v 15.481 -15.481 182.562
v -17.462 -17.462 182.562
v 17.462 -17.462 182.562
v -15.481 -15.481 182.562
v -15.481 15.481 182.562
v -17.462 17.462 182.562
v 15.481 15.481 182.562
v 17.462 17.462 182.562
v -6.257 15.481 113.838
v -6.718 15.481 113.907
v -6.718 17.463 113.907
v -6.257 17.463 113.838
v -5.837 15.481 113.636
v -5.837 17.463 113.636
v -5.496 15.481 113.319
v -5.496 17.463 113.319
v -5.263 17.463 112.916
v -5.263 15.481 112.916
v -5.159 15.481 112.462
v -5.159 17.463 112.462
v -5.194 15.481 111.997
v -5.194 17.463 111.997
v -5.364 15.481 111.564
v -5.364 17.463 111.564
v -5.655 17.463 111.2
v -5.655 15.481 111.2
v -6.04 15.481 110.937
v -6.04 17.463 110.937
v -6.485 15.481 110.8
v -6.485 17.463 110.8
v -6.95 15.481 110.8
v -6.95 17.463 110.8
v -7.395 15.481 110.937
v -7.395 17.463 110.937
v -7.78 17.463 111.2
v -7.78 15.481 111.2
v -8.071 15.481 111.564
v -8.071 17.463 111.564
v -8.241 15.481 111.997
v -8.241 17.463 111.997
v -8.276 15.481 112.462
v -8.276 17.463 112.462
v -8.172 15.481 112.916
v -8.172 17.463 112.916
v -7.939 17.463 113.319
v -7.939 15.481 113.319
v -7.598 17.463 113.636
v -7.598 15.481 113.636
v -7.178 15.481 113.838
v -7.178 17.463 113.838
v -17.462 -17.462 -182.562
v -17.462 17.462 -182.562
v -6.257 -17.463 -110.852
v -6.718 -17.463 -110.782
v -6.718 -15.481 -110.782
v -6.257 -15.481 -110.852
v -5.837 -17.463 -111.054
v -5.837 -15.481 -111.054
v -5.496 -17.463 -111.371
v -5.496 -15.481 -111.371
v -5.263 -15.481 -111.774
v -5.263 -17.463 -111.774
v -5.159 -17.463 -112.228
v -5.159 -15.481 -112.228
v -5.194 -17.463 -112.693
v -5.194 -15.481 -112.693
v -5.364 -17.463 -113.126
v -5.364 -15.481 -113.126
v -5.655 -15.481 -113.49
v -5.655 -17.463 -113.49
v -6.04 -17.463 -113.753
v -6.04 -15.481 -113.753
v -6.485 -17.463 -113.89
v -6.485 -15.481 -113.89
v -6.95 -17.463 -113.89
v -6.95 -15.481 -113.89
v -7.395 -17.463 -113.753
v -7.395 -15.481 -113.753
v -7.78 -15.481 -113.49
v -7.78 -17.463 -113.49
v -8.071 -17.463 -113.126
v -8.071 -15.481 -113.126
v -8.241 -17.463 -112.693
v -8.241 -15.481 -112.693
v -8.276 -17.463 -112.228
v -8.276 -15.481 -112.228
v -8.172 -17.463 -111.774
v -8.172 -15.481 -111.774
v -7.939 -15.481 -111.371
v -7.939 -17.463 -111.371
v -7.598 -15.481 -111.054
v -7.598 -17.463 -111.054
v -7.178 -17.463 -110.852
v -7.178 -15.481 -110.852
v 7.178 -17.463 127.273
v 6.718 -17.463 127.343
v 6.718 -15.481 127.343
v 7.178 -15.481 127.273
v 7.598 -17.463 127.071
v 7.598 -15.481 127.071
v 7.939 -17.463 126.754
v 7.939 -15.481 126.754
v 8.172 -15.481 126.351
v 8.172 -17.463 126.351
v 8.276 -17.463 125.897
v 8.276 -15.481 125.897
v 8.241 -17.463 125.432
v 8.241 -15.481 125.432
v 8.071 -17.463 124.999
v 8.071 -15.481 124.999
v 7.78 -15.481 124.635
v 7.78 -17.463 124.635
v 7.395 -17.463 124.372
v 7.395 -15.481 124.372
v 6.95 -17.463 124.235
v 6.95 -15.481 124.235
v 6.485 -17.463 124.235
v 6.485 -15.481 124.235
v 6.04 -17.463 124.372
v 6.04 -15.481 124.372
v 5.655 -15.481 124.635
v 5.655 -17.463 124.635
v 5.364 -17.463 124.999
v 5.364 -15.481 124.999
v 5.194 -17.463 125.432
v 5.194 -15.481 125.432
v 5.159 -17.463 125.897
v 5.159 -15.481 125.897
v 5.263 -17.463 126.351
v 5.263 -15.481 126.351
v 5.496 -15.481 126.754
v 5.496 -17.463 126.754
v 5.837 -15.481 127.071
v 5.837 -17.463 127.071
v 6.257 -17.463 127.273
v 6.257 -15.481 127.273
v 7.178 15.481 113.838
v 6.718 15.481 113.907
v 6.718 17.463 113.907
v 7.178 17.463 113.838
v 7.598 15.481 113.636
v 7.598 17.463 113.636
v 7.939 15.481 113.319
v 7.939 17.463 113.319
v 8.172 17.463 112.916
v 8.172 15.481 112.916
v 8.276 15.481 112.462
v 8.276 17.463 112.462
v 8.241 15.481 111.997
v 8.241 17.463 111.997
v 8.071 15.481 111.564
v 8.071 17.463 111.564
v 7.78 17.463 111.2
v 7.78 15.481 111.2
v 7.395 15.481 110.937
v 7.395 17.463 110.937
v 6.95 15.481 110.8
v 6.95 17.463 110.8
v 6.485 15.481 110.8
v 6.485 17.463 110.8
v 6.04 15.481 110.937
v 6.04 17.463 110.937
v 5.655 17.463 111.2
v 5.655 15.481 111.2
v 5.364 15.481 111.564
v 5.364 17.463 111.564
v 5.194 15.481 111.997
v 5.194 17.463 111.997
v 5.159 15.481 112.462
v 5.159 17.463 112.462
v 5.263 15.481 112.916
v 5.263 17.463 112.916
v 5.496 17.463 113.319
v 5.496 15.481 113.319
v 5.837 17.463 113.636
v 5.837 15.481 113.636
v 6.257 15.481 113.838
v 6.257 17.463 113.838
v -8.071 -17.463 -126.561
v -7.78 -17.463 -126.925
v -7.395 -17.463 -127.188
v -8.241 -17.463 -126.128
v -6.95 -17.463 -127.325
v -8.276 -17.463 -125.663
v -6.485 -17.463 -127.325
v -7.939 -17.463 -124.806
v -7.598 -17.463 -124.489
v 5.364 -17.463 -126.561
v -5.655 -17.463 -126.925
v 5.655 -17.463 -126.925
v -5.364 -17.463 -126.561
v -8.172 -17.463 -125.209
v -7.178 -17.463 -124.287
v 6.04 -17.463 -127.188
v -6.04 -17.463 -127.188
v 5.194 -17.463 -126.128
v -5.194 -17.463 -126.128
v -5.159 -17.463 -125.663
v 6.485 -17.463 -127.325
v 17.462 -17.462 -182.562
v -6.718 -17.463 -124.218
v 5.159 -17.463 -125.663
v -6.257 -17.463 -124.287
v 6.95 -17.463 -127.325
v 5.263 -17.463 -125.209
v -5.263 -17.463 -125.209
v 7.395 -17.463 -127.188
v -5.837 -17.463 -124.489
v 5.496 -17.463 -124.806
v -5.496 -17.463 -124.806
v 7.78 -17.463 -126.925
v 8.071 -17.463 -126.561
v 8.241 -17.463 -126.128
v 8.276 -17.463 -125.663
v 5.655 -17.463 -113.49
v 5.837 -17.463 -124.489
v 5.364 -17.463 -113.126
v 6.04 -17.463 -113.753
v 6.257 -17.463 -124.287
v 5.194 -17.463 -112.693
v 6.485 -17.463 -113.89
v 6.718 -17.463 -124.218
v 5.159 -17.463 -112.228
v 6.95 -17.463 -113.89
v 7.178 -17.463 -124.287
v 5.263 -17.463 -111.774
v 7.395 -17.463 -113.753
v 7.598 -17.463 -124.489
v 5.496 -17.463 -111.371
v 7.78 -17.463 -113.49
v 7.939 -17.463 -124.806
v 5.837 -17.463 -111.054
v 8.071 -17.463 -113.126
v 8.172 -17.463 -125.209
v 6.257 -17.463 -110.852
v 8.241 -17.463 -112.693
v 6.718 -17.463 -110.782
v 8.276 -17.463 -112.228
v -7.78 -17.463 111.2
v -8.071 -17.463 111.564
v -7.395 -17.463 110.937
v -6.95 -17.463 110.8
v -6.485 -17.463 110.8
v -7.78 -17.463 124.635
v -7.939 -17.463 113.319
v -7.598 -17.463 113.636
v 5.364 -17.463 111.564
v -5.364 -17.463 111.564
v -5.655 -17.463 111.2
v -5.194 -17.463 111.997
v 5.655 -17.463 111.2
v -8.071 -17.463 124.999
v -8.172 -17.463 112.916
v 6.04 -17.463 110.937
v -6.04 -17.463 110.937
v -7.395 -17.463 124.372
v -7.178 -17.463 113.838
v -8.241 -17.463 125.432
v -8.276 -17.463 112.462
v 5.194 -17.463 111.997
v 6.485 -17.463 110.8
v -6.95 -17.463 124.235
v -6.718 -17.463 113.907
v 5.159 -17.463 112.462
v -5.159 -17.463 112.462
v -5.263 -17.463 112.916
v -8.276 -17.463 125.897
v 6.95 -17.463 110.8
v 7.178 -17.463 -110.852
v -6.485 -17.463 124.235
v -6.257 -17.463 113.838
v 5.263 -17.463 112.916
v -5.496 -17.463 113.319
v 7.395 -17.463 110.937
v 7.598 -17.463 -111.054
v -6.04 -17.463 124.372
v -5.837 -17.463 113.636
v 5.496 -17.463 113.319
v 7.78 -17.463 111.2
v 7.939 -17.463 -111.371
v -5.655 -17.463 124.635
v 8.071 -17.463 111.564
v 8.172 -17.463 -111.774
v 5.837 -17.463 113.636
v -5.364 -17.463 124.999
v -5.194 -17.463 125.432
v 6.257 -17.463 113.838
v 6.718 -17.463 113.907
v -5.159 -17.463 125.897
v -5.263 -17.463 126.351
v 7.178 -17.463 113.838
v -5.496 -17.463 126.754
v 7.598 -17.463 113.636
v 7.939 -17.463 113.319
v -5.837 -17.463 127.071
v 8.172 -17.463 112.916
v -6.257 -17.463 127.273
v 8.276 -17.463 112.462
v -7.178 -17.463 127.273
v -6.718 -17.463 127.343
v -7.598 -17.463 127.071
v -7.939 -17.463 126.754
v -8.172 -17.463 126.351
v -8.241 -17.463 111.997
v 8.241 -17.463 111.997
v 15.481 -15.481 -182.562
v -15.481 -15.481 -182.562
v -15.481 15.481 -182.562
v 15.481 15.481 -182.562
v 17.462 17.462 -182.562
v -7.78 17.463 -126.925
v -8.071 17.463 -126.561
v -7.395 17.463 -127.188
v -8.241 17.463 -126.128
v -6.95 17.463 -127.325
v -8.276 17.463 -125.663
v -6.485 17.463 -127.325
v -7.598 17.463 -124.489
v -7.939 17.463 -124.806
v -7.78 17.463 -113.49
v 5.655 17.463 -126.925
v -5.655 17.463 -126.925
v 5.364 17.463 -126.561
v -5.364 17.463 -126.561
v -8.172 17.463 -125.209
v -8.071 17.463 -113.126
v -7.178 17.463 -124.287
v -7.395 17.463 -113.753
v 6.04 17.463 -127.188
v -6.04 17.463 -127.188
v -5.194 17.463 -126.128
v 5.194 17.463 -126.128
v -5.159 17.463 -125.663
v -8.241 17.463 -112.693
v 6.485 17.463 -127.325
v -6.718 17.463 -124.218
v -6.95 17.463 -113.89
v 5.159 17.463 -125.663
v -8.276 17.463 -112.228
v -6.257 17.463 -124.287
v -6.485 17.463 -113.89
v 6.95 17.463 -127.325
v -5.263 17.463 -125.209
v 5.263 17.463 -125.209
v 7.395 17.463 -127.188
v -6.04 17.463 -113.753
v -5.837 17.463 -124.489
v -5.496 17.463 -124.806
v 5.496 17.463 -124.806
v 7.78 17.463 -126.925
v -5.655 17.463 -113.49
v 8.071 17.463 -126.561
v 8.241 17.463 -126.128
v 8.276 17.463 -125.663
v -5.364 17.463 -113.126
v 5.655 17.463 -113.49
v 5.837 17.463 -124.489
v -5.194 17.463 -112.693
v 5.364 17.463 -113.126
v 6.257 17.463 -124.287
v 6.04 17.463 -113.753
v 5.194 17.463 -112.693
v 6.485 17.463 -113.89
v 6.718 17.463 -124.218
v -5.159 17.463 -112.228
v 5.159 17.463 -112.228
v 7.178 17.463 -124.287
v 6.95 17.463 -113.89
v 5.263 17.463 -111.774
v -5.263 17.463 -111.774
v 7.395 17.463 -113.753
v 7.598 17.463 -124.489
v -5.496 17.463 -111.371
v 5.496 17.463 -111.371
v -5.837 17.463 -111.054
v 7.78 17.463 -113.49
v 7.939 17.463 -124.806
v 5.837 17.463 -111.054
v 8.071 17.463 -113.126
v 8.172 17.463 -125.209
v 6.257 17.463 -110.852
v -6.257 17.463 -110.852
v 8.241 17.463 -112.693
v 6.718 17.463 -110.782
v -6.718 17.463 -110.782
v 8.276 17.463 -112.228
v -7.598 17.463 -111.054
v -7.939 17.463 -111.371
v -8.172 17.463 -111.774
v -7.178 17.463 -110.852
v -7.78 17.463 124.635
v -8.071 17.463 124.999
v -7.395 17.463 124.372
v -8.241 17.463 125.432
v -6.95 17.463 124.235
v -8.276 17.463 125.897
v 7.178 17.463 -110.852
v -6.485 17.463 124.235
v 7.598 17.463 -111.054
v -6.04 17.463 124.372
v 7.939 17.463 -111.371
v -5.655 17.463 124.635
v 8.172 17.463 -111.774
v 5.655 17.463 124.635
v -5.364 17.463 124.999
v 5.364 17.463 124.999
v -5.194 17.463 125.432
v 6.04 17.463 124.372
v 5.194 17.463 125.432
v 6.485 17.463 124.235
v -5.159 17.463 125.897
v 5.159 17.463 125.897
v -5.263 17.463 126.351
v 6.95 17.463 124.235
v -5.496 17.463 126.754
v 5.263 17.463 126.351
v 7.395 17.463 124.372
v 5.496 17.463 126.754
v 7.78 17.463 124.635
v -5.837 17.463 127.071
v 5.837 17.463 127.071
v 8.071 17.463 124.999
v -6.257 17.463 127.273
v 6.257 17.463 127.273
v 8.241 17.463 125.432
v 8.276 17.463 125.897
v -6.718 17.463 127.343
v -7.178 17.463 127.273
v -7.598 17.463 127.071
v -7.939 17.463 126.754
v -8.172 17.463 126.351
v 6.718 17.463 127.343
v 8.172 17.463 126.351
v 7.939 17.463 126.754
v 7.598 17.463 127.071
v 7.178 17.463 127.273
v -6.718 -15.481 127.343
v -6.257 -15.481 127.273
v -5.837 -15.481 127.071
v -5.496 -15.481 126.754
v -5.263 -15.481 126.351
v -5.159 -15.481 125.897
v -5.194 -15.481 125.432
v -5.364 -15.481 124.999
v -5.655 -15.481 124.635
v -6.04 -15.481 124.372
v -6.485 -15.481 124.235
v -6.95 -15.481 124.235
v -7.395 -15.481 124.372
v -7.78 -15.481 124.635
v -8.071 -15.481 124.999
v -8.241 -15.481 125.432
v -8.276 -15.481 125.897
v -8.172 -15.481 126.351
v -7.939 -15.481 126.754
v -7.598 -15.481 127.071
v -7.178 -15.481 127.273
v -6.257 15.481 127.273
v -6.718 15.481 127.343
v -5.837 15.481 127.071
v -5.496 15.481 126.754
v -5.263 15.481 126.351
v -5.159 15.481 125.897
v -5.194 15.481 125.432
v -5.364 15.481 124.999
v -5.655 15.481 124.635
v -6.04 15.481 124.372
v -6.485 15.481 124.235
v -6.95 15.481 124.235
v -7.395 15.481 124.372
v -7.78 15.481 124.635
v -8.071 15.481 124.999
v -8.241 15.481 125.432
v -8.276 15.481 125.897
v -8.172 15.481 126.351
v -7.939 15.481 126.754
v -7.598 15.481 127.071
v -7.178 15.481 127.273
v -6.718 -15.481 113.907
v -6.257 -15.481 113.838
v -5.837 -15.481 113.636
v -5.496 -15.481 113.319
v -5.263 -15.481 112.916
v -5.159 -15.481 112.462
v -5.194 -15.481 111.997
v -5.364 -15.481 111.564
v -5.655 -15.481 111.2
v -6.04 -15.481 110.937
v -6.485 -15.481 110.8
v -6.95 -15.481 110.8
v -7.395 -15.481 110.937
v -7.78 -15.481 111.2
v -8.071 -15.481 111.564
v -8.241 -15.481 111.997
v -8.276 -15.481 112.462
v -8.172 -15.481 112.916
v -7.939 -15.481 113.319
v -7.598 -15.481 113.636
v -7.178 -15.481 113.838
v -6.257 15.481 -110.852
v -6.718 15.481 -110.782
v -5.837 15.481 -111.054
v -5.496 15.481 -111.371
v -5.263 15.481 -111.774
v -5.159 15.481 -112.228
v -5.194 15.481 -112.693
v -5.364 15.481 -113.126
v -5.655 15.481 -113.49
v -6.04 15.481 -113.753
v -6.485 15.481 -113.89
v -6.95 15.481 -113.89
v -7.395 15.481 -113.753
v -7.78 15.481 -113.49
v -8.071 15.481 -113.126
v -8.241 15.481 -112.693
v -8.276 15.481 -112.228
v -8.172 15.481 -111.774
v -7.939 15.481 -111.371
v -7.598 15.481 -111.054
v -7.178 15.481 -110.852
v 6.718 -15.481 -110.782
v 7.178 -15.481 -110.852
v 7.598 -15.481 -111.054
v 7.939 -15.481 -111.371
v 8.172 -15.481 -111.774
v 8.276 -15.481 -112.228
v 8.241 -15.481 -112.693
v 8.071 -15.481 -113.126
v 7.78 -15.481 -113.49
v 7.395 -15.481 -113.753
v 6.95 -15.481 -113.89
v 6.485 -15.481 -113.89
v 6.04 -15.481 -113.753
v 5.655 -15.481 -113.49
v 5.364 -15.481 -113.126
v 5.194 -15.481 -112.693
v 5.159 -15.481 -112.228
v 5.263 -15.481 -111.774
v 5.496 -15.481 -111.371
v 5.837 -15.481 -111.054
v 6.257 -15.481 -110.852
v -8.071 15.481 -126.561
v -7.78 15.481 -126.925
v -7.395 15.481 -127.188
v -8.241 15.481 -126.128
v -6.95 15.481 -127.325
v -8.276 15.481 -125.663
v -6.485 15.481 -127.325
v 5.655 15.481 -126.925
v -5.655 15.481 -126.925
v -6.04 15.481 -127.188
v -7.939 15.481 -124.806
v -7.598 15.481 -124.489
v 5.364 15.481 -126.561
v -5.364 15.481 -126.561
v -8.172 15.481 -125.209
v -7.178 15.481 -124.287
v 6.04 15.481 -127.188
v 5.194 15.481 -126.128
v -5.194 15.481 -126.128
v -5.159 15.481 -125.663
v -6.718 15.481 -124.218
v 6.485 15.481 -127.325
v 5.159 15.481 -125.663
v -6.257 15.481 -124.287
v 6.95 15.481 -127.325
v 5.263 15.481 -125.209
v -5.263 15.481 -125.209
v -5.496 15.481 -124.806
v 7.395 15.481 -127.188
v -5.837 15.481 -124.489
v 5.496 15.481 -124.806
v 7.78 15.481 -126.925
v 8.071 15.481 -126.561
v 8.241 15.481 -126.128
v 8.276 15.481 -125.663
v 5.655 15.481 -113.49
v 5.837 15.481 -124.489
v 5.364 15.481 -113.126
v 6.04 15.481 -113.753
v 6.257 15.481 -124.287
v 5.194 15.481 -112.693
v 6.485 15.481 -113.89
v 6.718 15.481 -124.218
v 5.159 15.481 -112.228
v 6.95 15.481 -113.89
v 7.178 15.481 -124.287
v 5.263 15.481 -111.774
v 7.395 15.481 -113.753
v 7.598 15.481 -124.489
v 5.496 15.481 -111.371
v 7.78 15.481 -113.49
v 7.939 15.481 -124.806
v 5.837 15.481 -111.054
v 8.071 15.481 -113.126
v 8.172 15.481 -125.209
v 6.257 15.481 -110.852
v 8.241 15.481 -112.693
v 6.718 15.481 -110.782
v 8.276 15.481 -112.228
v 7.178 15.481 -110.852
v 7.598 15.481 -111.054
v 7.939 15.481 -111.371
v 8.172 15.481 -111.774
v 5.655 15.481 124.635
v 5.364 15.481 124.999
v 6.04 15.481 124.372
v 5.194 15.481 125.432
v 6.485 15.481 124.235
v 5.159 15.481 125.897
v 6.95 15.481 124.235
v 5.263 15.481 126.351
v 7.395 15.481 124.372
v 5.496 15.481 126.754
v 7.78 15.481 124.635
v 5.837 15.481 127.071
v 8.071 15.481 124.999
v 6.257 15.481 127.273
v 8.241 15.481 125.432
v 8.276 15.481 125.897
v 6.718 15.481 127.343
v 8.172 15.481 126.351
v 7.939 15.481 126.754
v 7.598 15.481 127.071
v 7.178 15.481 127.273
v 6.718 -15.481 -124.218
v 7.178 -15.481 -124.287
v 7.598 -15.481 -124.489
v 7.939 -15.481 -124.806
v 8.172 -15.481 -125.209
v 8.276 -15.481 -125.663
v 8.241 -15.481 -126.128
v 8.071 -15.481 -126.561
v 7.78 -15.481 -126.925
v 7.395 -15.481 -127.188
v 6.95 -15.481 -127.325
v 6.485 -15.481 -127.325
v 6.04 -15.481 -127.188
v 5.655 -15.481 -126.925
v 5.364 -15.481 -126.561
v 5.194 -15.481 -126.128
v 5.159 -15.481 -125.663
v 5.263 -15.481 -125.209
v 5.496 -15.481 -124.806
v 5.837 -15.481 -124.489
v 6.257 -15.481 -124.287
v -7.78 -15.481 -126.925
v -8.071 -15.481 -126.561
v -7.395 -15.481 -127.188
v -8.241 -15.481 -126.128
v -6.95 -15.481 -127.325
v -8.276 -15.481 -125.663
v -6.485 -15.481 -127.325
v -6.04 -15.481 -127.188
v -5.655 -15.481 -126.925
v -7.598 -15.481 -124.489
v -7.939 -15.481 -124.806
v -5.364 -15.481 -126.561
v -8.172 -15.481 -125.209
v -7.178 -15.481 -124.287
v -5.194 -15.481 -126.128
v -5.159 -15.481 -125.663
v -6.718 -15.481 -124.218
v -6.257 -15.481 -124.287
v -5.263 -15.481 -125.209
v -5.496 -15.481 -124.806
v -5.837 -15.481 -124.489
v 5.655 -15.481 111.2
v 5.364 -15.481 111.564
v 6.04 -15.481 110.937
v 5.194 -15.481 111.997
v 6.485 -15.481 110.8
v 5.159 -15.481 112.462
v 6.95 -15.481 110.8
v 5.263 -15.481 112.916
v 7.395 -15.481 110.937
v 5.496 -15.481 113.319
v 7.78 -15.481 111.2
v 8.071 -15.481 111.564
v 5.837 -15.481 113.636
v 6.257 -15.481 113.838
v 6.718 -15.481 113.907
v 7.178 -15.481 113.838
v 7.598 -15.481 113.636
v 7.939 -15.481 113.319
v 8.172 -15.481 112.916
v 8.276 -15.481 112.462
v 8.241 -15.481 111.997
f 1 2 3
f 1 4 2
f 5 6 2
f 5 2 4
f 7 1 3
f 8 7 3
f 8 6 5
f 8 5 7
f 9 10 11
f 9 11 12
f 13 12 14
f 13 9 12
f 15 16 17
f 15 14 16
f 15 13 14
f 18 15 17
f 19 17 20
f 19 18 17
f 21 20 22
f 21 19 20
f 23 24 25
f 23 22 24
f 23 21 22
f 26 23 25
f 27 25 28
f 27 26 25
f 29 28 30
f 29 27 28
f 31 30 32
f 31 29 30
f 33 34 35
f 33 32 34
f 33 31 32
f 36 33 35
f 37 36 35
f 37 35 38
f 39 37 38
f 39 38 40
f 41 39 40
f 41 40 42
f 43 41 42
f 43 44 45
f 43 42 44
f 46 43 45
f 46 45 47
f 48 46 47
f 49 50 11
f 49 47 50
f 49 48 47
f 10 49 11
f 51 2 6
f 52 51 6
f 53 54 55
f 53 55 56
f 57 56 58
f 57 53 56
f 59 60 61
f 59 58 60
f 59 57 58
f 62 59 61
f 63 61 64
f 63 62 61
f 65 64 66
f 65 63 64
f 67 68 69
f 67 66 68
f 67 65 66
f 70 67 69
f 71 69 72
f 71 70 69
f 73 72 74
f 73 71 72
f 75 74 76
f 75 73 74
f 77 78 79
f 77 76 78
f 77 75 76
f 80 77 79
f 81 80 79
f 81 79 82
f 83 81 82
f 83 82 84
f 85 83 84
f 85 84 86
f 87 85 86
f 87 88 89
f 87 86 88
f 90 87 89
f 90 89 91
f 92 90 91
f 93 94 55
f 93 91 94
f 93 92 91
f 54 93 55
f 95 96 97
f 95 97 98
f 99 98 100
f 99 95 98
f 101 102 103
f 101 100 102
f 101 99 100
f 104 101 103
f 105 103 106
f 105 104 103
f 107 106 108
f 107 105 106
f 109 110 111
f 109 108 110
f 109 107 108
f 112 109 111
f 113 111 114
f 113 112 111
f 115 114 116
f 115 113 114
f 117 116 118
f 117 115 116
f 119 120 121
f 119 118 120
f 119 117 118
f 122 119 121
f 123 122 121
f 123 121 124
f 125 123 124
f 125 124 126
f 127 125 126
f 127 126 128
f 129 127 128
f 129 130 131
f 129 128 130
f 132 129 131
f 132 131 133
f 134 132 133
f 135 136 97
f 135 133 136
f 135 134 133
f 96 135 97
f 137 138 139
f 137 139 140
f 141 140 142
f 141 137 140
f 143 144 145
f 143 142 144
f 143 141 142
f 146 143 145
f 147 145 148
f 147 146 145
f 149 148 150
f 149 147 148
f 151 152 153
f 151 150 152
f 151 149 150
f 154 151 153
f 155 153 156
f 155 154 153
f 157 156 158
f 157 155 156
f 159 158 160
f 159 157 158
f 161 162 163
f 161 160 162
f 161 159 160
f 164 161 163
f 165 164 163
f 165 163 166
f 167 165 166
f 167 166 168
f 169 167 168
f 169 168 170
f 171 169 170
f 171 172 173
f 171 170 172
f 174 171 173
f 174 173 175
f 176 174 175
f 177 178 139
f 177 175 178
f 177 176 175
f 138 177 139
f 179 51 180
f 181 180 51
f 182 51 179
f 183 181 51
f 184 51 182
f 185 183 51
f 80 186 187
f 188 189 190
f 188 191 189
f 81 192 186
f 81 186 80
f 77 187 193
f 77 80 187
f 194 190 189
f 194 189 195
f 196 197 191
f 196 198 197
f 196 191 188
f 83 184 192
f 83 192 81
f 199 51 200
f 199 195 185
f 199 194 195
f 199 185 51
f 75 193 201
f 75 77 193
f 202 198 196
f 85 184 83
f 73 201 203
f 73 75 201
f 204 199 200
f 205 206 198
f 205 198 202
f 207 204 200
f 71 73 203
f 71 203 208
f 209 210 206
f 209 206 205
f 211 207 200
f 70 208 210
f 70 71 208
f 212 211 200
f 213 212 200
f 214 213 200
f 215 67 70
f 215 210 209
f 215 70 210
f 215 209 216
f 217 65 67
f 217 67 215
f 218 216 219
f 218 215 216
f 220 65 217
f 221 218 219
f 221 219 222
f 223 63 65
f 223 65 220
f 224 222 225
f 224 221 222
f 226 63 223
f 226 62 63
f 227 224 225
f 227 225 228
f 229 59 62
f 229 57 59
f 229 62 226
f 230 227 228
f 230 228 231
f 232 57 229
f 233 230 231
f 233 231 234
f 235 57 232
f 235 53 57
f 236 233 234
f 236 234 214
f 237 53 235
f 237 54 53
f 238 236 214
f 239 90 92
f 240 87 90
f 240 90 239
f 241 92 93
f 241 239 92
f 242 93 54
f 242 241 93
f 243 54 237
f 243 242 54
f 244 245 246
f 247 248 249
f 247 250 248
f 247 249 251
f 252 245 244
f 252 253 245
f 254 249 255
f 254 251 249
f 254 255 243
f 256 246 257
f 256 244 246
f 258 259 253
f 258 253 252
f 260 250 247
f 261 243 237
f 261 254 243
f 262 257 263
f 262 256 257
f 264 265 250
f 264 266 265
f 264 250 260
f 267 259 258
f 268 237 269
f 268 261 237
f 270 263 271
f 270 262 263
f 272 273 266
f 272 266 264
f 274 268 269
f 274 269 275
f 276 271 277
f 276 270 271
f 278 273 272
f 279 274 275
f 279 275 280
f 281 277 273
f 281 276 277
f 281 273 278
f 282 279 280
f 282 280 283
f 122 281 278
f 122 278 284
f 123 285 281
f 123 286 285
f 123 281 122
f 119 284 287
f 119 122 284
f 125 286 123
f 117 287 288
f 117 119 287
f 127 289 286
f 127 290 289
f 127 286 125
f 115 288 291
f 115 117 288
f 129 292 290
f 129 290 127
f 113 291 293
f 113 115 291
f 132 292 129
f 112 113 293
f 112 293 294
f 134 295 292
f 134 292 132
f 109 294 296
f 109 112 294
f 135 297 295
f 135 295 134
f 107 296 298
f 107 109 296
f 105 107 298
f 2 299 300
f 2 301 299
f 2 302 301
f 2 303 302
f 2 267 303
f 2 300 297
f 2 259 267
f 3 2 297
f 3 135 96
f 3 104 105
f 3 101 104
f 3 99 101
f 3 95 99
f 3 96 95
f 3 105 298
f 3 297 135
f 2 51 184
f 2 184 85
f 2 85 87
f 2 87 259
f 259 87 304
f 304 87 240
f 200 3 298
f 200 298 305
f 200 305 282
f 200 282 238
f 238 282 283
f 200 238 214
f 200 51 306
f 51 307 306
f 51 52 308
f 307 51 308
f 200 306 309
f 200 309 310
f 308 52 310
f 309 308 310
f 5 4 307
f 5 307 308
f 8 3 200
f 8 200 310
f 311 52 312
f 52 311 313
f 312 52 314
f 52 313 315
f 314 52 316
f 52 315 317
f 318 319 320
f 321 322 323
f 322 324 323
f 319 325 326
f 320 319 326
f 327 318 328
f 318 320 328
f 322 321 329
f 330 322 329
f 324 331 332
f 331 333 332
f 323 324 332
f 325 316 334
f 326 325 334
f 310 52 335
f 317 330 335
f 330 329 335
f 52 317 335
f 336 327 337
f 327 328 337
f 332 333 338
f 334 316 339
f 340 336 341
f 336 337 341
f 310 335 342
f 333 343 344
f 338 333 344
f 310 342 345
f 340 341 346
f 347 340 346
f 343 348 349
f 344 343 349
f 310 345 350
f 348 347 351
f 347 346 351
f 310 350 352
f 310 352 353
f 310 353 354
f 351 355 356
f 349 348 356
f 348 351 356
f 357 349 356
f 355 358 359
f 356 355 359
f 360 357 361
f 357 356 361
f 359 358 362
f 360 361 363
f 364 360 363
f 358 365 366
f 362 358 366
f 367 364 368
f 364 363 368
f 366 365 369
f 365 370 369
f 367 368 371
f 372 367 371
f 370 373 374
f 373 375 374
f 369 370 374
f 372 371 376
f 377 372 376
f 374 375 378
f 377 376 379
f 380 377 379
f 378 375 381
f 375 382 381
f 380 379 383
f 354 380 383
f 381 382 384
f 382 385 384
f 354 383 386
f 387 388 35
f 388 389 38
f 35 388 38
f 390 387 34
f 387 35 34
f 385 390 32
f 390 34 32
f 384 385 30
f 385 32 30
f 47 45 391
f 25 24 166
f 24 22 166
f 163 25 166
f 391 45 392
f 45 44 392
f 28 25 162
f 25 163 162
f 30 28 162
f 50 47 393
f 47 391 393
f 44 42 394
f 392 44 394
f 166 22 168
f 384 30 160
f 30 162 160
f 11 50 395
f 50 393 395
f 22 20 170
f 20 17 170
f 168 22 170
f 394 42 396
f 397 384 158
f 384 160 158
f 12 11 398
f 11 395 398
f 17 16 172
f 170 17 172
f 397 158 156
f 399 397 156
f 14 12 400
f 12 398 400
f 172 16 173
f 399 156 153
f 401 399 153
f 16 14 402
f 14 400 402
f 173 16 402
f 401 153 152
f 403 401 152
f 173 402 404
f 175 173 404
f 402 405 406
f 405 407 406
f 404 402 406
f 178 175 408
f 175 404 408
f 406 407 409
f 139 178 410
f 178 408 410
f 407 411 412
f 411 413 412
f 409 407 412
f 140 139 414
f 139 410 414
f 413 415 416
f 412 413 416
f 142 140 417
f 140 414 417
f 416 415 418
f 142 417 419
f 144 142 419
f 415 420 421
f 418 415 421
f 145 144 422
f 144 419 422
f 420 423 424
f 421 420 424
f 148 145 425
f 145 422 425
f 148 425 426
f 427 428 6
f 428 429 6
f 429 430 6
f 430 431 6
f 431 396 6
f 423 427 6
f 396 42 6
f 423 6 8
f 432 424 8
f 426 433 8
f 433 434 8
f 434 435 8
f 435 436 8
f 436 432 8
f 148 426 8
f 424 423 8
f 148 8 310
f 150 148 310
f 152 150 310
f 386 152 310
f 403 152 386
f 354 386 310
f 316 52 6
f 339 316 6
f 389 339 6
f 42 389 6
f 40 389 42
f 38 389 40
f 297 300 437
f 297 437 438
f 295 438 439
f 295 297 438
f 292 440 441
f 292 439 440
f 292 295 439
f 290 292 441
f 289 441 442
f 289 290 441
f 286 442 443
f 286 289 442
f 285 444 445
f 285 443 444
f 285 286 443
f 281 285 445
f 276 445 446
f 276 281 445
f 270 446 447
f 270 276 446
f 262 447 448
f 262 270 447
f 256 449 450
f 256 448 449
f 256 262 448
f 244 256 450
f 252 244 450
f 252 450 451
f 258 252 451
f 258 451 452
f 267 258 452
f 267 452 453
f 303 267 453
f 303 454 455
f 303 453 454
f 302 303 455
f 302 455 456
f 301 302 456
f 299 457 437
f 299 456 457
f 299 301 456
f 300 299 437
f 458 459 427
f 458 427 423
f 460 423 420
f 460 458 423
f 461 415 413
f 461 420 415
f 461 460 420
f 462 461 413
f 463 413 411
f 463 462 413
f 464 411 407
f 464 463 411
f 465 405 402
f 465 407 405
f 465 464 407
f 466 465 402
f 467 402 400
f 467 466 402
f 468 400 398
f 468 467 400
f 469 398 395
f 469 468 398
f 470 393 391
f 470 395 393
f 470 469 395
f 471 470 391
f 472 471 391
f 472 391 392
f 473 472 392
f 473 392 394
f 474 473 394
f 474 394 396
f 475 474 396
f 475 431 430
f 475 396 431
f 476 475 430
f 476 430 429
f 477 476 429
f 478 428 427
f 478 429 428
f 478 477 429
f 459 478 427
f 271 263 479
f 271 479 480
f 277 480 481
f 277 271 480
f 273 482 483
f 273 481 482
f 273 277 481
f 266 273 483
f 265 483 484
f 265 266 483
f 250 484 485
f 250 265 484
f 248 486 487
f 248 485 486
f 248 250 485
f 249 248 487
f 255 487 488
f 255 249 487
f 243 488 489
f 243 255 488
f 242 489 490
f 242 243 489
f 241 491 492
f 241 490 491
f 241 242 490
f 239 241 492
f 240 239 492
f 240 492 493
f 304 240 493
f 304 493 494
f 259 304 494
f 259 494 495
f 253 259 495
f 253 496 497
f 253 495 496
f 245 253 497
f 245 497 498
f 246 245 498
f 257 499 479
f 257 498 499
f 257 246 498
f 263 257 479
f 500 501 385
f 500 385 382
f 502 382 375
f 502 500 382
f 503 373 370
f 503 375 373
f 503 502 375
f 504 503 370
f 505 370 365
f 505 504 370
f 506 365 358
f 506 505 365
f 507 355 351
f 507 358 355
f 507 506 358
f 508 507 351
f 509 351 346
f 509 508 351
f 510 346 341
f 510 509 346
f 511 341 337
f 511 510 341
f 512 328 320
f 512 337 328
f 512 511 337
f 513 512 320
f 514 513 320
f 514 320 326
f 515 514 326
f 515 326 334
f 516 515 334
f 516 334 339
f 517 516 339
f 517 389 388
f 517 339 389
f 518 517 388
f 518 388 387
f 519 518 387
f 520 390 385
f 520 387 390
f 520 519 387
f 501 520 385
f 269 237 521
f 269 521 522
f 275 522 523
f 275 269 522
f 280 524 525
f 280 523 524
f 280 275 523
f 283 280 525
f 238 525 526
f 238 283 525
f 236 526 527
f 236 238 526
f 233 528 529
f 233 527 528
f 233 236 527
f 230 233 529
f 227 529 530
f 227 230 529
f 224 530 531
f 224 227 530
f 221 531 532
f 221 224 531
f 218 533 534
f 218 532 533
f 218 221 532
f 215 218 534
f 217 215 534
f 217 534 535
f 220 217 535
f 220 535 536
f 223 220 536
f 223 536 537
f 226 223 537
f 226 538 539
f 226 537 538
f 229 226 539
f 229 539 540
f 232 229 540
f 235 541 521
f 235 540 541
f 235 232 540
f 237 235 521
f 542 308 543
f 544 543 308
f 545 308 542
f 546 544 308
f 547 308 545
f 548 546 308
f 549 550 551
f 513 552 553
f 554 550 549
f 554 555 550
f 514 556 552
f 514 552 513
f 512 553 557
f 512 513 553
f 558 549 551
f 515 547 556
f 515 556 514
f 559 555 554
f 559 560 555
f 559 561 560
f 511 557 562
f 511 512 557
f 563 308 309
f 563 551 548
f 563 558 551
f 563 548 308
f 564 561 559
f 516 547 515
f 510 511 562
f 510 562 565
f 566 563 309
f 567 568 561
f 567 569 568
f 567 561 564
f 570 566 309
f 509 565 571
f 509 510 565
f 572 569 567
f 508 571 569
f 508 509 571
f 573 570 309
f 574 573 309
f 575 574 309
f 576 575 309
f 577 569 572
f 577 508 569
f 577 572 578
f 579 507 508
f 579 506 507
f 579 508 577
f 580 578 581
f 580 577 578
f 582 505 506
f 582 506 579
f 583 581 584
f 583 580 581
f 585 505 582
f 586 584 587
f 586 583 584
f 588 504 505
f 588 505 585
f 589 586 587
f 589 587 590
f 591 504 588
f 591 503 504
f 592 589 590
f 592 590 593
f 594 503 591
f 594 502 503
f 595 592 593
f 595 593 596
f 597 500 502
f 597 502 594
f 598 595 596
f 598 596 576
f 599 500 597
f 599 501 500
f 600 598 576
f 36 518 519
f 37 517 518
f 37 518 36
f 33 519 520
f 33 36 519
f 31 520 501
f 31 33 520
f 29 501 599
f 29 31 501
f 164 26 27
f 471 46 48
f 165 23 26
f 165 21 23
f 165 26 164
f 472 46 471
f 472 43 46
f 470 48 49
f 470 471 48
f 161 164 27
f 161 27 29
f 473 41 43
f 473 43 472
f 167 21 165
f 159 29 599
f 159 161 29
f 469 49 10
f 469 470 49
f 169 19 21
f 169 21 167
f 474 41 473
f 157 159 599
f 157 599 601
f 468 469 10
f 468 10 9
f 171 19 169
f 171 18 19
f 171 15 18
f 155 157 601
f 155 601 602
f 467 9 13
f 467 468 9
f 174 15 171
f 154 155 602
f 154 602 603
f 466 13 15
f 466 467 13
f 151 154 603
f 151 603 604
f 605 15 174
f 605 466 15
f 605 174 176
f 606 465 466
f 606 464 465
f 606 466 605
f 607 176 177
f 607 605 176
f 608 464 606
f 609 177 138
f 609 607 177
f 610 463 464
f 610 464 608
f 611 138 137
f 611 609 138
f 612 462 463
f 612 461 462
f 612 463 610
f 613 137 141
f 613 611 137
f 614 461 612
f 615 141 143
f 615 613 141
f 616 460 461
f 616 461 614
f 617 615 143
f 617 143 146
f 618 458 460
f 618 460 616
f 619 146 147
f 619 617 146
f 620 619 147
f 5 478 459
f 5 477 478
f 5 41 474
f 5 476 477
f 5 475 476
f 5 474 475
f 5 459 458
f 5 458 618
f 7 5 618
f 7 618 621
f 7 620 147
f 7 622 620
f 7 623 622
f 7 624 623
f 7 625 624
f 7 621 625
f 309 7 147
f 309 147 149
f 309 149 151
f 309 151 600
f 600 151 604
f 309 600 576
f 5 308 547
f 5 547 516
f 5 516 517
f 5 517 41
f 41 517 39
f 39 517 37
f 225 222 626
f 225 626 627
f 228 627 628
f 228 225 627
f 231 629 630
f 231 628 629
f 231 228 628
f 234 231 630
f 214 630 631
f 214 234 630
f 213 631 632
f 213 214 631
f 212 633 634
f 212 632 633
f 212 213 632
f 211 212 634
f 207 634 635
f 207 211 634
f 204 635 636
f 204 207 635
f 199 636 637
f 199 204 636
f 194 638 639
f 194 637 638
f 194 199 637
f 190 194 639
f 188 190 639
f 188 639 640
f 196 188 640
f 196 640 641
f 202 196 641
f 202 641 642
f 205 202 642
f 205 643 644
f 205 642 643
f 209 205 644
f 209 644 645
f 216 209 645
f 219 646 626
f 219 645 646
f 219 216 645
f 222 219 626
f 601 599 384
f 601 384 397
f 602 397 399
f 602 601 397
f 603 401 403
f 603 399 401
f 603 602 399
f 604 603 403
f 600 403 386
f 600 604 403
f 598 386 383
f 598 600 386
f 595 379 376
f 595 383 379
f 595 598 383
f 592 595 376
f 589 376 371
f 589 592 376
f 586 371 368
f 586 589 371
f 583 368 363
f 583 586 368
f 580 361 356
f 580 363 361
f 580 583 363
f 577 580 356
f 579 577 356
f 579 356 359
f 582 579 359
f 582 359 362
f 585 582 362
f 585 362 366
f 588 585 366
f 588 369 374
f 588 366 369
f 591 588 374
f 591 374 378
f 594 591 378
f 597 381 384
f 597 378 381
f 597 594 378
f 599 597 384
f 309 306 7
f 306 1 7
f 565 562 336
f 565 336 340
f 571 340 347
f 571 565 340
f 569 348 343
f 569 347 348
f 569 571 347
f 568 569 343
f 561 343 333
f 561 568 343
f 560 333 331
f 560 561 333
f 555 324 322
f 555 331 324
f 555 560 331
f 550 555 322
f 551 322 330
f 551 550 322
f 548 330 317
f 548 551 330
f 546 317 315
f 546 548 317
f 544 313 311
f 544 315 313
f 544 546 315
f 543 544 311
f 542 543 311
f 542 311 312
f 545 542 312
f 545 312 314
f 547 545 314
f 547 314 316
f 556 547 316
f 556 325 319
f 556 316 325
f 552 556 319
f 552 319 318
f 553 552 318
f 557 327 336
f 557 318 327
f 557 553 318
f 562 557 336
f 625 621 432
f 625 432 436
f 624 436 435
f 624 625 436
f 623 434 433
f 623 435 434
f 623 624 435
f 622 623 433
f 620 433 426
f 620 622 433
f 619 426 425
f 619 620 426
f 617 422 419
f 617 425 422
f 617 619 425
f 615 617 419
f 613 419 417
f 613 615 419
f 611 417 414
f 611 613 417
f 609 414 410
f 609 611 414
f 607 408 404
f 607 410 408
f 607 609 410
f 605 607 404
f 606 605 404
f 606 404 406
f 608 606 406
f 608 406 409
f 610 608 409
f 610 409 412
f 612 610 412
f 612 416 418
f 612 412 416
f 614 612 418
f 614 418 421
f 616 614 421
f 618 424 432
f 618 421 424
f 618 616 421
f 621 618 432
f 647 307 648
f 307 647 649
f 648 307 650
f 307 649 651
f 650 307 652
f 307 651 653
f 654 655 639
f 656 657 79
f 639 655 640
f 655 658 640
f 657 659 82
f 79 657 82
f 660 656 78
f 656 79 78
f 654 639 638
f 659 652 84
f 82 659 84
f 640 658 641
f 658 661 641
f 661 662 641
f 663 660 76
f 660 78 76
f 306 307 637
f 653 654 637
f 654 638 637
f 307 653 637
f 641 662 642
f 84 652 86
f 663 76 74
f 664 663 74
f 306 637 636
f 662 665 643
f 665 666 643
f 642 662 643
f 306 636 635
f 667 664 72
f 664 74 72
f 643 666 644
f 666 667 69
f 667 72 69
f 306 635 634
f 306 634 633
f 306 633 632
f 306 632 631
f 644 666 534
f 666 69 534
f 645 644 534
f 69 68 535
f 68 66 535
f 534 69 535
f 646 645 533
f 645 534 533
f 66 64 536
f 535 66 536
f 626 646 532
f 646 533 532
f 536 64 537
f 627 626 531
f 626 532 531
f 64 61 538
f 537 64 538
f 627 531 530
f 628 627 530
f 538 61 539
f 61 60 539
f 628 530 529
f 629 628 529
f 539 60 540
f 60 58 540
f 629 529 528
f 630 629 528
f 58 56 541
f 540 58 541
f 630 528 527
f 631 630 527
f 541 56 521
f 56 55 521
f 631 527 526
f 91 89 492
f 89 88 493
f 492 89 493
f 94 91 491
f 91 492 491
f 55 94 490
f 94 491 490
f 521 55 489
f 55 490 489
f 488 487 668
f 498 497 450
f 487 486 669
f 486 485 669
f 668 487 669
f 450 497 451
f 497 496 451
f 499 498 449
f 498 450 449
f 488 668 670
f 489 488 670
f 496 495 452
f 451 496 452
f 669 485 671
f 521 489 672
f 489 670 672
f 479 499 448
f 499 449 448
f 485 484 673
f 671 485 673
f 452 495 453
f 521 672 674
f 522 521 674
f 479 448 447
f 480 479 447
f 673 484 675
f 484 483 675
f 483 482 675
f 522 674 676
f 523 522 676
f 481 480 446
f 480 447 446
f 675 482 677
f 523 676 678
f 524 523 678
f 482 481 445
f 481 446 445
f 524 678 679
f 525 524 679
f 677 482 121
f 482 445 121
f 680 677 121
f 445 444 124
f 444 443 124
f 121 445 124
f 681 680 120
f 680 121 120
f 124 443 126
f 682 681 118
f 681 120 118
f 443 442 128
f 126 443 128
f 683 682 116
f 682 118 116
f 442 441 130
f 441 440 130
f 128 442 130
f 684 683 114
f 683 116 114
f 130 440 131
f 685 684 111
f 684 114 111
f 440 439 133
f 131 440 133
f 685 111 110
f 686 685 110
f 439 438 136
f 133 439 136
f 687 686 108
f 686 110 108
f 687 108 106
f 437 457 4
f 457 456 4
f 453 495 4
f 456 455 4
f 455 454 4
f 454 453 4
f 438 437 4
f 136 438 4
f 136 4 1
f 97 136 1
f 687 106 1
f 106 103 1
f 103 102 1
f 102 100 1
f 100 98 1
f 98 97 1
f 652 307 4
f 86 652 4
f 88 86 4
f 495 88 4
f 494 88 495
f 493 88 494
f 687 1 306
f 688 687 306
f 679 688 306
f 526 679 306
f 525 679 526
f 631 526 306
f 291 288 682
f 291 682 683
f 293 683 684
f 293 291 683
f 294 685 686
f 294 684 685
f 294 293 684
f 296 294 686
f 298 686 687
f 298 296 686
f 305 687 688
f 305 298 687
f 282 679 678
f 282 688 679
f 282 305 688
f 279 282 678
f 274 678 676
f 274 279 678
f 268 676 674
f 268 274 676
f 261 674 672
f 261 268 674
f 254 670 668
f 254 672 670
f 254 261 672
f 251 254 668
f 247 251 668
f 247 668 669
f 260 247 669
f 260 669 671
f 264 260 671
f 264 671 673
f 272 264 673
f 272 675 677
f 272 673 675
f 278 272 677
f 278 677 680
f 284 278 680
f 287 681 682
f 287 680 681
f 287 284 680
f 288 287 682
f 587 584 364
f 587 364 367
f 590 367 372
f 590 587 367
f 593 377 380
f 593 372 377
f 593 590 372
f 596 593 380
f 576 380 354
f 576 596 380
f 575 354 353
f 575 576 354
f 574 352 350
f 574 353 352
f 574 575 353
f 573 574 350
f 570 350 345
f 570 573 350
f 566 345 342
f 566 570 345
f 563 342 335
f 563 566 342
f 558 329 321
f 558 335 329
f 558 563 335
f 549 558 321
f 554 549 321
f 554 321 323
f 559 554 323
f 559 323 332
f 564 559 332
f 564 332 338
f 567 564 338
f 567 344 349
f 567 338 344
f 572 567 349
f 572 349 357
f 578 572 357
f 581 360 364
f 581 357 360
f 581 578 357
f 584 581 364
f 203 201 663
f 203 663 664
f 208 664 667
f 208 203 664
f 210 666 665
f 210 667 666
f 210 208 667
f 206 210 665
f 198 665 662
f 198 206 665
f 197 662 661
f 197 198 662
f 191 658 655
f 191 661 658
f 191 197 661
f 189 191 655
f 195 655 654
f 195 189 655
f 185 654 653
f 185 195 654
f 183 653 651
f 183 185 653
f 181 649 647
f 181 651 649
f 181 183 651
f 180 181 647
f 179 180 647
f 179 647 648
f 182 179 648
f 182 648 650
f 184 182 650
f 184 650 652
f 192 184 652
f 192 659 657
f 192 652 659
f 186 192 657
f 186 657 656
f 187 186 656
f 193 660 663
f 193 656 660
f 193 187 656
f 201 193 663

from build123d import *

# Parameters (mm, degrees)
SKETCH1_W               = 34.925
SKETCH1_H               = 34.925
SKETCH1_W_2             = 30.9626
SKETCH1_H_2             = 30.9626
BOSS_EXTRUDE1_DEPTH     = 182.5625
CUT_EXTRUDE1_DEPTH      = 185.22525402
CUT_EXTRUDE1_DEPTH_BACK = 185.22525402
SKETCH2_R               = 1.56250005


with BuildPart() as part:
    # Sketch1 → Boss-Extrude1 (new, symmetric)
    with BuildSketch(Plane.XY):
        Rectangle(SKETCH1_W, SKETCH1_H)
        Rectangle(SKETCH1_W_2, SKETCH1_H_2, mode=Mode.SUBTRACT)
    extrude(amount=BOSS_EXTRUDE1_DEPTH, both=True)

    # Sketch2 → Cut-Extrude1 (cut, two sides: drawn at the far end of the back side and taken through both)
    with BuildSketch(Plane(origin=(0, 0, 0), x_dir=(1, 0, 0), z_dir=(0, 1, 0)).offset(-CUT_EXTRUDE1_DEPTH_BACK)):
        with Locations(Location((-6.717514421, 125.780014421, 0), (0, 0, 270))):
            Circle(SKETCH2_R)
        with Locations(Location((6.717514421, 125.780014421, 0), (0, 0, 270))):
            Circle(SKETCH2_R)
        with Locations(Location((6.717514421, 112.344985579, 0), (0, 0, 270))):
            Circle(SKETCH2_R)
        with Locations(Location((-6.717514421, 112.344985579, 0), (0, 0, 270))):
            Circle(SKETCH2_R)
        with Locations(Location((-6.717514421, -112.344985579, 0), (0, 0, 270))):
            Circle(SKETCH2_R)
        with Locations(Location((6.717514421, -112.344985579, 0), (0, 0, 270))):
            Circle(SKETCH2_R)
        with Locations(Location((6.717514421, -125.780014421, 0), (0, 0, 270))):
            Circle(SKETCH2_R)
        with Locations(Location((-6.717514421, -125.780014421, 0), (0, 0, 270))):
            Circle(SKETCH2_R)
    extrude(amount=CUT_EXTRUDE1_DEPTH + CUT_EXTRUDE1_DEPTH_BACK, mode=Mode.SUBTRACT)


solid = part.part
